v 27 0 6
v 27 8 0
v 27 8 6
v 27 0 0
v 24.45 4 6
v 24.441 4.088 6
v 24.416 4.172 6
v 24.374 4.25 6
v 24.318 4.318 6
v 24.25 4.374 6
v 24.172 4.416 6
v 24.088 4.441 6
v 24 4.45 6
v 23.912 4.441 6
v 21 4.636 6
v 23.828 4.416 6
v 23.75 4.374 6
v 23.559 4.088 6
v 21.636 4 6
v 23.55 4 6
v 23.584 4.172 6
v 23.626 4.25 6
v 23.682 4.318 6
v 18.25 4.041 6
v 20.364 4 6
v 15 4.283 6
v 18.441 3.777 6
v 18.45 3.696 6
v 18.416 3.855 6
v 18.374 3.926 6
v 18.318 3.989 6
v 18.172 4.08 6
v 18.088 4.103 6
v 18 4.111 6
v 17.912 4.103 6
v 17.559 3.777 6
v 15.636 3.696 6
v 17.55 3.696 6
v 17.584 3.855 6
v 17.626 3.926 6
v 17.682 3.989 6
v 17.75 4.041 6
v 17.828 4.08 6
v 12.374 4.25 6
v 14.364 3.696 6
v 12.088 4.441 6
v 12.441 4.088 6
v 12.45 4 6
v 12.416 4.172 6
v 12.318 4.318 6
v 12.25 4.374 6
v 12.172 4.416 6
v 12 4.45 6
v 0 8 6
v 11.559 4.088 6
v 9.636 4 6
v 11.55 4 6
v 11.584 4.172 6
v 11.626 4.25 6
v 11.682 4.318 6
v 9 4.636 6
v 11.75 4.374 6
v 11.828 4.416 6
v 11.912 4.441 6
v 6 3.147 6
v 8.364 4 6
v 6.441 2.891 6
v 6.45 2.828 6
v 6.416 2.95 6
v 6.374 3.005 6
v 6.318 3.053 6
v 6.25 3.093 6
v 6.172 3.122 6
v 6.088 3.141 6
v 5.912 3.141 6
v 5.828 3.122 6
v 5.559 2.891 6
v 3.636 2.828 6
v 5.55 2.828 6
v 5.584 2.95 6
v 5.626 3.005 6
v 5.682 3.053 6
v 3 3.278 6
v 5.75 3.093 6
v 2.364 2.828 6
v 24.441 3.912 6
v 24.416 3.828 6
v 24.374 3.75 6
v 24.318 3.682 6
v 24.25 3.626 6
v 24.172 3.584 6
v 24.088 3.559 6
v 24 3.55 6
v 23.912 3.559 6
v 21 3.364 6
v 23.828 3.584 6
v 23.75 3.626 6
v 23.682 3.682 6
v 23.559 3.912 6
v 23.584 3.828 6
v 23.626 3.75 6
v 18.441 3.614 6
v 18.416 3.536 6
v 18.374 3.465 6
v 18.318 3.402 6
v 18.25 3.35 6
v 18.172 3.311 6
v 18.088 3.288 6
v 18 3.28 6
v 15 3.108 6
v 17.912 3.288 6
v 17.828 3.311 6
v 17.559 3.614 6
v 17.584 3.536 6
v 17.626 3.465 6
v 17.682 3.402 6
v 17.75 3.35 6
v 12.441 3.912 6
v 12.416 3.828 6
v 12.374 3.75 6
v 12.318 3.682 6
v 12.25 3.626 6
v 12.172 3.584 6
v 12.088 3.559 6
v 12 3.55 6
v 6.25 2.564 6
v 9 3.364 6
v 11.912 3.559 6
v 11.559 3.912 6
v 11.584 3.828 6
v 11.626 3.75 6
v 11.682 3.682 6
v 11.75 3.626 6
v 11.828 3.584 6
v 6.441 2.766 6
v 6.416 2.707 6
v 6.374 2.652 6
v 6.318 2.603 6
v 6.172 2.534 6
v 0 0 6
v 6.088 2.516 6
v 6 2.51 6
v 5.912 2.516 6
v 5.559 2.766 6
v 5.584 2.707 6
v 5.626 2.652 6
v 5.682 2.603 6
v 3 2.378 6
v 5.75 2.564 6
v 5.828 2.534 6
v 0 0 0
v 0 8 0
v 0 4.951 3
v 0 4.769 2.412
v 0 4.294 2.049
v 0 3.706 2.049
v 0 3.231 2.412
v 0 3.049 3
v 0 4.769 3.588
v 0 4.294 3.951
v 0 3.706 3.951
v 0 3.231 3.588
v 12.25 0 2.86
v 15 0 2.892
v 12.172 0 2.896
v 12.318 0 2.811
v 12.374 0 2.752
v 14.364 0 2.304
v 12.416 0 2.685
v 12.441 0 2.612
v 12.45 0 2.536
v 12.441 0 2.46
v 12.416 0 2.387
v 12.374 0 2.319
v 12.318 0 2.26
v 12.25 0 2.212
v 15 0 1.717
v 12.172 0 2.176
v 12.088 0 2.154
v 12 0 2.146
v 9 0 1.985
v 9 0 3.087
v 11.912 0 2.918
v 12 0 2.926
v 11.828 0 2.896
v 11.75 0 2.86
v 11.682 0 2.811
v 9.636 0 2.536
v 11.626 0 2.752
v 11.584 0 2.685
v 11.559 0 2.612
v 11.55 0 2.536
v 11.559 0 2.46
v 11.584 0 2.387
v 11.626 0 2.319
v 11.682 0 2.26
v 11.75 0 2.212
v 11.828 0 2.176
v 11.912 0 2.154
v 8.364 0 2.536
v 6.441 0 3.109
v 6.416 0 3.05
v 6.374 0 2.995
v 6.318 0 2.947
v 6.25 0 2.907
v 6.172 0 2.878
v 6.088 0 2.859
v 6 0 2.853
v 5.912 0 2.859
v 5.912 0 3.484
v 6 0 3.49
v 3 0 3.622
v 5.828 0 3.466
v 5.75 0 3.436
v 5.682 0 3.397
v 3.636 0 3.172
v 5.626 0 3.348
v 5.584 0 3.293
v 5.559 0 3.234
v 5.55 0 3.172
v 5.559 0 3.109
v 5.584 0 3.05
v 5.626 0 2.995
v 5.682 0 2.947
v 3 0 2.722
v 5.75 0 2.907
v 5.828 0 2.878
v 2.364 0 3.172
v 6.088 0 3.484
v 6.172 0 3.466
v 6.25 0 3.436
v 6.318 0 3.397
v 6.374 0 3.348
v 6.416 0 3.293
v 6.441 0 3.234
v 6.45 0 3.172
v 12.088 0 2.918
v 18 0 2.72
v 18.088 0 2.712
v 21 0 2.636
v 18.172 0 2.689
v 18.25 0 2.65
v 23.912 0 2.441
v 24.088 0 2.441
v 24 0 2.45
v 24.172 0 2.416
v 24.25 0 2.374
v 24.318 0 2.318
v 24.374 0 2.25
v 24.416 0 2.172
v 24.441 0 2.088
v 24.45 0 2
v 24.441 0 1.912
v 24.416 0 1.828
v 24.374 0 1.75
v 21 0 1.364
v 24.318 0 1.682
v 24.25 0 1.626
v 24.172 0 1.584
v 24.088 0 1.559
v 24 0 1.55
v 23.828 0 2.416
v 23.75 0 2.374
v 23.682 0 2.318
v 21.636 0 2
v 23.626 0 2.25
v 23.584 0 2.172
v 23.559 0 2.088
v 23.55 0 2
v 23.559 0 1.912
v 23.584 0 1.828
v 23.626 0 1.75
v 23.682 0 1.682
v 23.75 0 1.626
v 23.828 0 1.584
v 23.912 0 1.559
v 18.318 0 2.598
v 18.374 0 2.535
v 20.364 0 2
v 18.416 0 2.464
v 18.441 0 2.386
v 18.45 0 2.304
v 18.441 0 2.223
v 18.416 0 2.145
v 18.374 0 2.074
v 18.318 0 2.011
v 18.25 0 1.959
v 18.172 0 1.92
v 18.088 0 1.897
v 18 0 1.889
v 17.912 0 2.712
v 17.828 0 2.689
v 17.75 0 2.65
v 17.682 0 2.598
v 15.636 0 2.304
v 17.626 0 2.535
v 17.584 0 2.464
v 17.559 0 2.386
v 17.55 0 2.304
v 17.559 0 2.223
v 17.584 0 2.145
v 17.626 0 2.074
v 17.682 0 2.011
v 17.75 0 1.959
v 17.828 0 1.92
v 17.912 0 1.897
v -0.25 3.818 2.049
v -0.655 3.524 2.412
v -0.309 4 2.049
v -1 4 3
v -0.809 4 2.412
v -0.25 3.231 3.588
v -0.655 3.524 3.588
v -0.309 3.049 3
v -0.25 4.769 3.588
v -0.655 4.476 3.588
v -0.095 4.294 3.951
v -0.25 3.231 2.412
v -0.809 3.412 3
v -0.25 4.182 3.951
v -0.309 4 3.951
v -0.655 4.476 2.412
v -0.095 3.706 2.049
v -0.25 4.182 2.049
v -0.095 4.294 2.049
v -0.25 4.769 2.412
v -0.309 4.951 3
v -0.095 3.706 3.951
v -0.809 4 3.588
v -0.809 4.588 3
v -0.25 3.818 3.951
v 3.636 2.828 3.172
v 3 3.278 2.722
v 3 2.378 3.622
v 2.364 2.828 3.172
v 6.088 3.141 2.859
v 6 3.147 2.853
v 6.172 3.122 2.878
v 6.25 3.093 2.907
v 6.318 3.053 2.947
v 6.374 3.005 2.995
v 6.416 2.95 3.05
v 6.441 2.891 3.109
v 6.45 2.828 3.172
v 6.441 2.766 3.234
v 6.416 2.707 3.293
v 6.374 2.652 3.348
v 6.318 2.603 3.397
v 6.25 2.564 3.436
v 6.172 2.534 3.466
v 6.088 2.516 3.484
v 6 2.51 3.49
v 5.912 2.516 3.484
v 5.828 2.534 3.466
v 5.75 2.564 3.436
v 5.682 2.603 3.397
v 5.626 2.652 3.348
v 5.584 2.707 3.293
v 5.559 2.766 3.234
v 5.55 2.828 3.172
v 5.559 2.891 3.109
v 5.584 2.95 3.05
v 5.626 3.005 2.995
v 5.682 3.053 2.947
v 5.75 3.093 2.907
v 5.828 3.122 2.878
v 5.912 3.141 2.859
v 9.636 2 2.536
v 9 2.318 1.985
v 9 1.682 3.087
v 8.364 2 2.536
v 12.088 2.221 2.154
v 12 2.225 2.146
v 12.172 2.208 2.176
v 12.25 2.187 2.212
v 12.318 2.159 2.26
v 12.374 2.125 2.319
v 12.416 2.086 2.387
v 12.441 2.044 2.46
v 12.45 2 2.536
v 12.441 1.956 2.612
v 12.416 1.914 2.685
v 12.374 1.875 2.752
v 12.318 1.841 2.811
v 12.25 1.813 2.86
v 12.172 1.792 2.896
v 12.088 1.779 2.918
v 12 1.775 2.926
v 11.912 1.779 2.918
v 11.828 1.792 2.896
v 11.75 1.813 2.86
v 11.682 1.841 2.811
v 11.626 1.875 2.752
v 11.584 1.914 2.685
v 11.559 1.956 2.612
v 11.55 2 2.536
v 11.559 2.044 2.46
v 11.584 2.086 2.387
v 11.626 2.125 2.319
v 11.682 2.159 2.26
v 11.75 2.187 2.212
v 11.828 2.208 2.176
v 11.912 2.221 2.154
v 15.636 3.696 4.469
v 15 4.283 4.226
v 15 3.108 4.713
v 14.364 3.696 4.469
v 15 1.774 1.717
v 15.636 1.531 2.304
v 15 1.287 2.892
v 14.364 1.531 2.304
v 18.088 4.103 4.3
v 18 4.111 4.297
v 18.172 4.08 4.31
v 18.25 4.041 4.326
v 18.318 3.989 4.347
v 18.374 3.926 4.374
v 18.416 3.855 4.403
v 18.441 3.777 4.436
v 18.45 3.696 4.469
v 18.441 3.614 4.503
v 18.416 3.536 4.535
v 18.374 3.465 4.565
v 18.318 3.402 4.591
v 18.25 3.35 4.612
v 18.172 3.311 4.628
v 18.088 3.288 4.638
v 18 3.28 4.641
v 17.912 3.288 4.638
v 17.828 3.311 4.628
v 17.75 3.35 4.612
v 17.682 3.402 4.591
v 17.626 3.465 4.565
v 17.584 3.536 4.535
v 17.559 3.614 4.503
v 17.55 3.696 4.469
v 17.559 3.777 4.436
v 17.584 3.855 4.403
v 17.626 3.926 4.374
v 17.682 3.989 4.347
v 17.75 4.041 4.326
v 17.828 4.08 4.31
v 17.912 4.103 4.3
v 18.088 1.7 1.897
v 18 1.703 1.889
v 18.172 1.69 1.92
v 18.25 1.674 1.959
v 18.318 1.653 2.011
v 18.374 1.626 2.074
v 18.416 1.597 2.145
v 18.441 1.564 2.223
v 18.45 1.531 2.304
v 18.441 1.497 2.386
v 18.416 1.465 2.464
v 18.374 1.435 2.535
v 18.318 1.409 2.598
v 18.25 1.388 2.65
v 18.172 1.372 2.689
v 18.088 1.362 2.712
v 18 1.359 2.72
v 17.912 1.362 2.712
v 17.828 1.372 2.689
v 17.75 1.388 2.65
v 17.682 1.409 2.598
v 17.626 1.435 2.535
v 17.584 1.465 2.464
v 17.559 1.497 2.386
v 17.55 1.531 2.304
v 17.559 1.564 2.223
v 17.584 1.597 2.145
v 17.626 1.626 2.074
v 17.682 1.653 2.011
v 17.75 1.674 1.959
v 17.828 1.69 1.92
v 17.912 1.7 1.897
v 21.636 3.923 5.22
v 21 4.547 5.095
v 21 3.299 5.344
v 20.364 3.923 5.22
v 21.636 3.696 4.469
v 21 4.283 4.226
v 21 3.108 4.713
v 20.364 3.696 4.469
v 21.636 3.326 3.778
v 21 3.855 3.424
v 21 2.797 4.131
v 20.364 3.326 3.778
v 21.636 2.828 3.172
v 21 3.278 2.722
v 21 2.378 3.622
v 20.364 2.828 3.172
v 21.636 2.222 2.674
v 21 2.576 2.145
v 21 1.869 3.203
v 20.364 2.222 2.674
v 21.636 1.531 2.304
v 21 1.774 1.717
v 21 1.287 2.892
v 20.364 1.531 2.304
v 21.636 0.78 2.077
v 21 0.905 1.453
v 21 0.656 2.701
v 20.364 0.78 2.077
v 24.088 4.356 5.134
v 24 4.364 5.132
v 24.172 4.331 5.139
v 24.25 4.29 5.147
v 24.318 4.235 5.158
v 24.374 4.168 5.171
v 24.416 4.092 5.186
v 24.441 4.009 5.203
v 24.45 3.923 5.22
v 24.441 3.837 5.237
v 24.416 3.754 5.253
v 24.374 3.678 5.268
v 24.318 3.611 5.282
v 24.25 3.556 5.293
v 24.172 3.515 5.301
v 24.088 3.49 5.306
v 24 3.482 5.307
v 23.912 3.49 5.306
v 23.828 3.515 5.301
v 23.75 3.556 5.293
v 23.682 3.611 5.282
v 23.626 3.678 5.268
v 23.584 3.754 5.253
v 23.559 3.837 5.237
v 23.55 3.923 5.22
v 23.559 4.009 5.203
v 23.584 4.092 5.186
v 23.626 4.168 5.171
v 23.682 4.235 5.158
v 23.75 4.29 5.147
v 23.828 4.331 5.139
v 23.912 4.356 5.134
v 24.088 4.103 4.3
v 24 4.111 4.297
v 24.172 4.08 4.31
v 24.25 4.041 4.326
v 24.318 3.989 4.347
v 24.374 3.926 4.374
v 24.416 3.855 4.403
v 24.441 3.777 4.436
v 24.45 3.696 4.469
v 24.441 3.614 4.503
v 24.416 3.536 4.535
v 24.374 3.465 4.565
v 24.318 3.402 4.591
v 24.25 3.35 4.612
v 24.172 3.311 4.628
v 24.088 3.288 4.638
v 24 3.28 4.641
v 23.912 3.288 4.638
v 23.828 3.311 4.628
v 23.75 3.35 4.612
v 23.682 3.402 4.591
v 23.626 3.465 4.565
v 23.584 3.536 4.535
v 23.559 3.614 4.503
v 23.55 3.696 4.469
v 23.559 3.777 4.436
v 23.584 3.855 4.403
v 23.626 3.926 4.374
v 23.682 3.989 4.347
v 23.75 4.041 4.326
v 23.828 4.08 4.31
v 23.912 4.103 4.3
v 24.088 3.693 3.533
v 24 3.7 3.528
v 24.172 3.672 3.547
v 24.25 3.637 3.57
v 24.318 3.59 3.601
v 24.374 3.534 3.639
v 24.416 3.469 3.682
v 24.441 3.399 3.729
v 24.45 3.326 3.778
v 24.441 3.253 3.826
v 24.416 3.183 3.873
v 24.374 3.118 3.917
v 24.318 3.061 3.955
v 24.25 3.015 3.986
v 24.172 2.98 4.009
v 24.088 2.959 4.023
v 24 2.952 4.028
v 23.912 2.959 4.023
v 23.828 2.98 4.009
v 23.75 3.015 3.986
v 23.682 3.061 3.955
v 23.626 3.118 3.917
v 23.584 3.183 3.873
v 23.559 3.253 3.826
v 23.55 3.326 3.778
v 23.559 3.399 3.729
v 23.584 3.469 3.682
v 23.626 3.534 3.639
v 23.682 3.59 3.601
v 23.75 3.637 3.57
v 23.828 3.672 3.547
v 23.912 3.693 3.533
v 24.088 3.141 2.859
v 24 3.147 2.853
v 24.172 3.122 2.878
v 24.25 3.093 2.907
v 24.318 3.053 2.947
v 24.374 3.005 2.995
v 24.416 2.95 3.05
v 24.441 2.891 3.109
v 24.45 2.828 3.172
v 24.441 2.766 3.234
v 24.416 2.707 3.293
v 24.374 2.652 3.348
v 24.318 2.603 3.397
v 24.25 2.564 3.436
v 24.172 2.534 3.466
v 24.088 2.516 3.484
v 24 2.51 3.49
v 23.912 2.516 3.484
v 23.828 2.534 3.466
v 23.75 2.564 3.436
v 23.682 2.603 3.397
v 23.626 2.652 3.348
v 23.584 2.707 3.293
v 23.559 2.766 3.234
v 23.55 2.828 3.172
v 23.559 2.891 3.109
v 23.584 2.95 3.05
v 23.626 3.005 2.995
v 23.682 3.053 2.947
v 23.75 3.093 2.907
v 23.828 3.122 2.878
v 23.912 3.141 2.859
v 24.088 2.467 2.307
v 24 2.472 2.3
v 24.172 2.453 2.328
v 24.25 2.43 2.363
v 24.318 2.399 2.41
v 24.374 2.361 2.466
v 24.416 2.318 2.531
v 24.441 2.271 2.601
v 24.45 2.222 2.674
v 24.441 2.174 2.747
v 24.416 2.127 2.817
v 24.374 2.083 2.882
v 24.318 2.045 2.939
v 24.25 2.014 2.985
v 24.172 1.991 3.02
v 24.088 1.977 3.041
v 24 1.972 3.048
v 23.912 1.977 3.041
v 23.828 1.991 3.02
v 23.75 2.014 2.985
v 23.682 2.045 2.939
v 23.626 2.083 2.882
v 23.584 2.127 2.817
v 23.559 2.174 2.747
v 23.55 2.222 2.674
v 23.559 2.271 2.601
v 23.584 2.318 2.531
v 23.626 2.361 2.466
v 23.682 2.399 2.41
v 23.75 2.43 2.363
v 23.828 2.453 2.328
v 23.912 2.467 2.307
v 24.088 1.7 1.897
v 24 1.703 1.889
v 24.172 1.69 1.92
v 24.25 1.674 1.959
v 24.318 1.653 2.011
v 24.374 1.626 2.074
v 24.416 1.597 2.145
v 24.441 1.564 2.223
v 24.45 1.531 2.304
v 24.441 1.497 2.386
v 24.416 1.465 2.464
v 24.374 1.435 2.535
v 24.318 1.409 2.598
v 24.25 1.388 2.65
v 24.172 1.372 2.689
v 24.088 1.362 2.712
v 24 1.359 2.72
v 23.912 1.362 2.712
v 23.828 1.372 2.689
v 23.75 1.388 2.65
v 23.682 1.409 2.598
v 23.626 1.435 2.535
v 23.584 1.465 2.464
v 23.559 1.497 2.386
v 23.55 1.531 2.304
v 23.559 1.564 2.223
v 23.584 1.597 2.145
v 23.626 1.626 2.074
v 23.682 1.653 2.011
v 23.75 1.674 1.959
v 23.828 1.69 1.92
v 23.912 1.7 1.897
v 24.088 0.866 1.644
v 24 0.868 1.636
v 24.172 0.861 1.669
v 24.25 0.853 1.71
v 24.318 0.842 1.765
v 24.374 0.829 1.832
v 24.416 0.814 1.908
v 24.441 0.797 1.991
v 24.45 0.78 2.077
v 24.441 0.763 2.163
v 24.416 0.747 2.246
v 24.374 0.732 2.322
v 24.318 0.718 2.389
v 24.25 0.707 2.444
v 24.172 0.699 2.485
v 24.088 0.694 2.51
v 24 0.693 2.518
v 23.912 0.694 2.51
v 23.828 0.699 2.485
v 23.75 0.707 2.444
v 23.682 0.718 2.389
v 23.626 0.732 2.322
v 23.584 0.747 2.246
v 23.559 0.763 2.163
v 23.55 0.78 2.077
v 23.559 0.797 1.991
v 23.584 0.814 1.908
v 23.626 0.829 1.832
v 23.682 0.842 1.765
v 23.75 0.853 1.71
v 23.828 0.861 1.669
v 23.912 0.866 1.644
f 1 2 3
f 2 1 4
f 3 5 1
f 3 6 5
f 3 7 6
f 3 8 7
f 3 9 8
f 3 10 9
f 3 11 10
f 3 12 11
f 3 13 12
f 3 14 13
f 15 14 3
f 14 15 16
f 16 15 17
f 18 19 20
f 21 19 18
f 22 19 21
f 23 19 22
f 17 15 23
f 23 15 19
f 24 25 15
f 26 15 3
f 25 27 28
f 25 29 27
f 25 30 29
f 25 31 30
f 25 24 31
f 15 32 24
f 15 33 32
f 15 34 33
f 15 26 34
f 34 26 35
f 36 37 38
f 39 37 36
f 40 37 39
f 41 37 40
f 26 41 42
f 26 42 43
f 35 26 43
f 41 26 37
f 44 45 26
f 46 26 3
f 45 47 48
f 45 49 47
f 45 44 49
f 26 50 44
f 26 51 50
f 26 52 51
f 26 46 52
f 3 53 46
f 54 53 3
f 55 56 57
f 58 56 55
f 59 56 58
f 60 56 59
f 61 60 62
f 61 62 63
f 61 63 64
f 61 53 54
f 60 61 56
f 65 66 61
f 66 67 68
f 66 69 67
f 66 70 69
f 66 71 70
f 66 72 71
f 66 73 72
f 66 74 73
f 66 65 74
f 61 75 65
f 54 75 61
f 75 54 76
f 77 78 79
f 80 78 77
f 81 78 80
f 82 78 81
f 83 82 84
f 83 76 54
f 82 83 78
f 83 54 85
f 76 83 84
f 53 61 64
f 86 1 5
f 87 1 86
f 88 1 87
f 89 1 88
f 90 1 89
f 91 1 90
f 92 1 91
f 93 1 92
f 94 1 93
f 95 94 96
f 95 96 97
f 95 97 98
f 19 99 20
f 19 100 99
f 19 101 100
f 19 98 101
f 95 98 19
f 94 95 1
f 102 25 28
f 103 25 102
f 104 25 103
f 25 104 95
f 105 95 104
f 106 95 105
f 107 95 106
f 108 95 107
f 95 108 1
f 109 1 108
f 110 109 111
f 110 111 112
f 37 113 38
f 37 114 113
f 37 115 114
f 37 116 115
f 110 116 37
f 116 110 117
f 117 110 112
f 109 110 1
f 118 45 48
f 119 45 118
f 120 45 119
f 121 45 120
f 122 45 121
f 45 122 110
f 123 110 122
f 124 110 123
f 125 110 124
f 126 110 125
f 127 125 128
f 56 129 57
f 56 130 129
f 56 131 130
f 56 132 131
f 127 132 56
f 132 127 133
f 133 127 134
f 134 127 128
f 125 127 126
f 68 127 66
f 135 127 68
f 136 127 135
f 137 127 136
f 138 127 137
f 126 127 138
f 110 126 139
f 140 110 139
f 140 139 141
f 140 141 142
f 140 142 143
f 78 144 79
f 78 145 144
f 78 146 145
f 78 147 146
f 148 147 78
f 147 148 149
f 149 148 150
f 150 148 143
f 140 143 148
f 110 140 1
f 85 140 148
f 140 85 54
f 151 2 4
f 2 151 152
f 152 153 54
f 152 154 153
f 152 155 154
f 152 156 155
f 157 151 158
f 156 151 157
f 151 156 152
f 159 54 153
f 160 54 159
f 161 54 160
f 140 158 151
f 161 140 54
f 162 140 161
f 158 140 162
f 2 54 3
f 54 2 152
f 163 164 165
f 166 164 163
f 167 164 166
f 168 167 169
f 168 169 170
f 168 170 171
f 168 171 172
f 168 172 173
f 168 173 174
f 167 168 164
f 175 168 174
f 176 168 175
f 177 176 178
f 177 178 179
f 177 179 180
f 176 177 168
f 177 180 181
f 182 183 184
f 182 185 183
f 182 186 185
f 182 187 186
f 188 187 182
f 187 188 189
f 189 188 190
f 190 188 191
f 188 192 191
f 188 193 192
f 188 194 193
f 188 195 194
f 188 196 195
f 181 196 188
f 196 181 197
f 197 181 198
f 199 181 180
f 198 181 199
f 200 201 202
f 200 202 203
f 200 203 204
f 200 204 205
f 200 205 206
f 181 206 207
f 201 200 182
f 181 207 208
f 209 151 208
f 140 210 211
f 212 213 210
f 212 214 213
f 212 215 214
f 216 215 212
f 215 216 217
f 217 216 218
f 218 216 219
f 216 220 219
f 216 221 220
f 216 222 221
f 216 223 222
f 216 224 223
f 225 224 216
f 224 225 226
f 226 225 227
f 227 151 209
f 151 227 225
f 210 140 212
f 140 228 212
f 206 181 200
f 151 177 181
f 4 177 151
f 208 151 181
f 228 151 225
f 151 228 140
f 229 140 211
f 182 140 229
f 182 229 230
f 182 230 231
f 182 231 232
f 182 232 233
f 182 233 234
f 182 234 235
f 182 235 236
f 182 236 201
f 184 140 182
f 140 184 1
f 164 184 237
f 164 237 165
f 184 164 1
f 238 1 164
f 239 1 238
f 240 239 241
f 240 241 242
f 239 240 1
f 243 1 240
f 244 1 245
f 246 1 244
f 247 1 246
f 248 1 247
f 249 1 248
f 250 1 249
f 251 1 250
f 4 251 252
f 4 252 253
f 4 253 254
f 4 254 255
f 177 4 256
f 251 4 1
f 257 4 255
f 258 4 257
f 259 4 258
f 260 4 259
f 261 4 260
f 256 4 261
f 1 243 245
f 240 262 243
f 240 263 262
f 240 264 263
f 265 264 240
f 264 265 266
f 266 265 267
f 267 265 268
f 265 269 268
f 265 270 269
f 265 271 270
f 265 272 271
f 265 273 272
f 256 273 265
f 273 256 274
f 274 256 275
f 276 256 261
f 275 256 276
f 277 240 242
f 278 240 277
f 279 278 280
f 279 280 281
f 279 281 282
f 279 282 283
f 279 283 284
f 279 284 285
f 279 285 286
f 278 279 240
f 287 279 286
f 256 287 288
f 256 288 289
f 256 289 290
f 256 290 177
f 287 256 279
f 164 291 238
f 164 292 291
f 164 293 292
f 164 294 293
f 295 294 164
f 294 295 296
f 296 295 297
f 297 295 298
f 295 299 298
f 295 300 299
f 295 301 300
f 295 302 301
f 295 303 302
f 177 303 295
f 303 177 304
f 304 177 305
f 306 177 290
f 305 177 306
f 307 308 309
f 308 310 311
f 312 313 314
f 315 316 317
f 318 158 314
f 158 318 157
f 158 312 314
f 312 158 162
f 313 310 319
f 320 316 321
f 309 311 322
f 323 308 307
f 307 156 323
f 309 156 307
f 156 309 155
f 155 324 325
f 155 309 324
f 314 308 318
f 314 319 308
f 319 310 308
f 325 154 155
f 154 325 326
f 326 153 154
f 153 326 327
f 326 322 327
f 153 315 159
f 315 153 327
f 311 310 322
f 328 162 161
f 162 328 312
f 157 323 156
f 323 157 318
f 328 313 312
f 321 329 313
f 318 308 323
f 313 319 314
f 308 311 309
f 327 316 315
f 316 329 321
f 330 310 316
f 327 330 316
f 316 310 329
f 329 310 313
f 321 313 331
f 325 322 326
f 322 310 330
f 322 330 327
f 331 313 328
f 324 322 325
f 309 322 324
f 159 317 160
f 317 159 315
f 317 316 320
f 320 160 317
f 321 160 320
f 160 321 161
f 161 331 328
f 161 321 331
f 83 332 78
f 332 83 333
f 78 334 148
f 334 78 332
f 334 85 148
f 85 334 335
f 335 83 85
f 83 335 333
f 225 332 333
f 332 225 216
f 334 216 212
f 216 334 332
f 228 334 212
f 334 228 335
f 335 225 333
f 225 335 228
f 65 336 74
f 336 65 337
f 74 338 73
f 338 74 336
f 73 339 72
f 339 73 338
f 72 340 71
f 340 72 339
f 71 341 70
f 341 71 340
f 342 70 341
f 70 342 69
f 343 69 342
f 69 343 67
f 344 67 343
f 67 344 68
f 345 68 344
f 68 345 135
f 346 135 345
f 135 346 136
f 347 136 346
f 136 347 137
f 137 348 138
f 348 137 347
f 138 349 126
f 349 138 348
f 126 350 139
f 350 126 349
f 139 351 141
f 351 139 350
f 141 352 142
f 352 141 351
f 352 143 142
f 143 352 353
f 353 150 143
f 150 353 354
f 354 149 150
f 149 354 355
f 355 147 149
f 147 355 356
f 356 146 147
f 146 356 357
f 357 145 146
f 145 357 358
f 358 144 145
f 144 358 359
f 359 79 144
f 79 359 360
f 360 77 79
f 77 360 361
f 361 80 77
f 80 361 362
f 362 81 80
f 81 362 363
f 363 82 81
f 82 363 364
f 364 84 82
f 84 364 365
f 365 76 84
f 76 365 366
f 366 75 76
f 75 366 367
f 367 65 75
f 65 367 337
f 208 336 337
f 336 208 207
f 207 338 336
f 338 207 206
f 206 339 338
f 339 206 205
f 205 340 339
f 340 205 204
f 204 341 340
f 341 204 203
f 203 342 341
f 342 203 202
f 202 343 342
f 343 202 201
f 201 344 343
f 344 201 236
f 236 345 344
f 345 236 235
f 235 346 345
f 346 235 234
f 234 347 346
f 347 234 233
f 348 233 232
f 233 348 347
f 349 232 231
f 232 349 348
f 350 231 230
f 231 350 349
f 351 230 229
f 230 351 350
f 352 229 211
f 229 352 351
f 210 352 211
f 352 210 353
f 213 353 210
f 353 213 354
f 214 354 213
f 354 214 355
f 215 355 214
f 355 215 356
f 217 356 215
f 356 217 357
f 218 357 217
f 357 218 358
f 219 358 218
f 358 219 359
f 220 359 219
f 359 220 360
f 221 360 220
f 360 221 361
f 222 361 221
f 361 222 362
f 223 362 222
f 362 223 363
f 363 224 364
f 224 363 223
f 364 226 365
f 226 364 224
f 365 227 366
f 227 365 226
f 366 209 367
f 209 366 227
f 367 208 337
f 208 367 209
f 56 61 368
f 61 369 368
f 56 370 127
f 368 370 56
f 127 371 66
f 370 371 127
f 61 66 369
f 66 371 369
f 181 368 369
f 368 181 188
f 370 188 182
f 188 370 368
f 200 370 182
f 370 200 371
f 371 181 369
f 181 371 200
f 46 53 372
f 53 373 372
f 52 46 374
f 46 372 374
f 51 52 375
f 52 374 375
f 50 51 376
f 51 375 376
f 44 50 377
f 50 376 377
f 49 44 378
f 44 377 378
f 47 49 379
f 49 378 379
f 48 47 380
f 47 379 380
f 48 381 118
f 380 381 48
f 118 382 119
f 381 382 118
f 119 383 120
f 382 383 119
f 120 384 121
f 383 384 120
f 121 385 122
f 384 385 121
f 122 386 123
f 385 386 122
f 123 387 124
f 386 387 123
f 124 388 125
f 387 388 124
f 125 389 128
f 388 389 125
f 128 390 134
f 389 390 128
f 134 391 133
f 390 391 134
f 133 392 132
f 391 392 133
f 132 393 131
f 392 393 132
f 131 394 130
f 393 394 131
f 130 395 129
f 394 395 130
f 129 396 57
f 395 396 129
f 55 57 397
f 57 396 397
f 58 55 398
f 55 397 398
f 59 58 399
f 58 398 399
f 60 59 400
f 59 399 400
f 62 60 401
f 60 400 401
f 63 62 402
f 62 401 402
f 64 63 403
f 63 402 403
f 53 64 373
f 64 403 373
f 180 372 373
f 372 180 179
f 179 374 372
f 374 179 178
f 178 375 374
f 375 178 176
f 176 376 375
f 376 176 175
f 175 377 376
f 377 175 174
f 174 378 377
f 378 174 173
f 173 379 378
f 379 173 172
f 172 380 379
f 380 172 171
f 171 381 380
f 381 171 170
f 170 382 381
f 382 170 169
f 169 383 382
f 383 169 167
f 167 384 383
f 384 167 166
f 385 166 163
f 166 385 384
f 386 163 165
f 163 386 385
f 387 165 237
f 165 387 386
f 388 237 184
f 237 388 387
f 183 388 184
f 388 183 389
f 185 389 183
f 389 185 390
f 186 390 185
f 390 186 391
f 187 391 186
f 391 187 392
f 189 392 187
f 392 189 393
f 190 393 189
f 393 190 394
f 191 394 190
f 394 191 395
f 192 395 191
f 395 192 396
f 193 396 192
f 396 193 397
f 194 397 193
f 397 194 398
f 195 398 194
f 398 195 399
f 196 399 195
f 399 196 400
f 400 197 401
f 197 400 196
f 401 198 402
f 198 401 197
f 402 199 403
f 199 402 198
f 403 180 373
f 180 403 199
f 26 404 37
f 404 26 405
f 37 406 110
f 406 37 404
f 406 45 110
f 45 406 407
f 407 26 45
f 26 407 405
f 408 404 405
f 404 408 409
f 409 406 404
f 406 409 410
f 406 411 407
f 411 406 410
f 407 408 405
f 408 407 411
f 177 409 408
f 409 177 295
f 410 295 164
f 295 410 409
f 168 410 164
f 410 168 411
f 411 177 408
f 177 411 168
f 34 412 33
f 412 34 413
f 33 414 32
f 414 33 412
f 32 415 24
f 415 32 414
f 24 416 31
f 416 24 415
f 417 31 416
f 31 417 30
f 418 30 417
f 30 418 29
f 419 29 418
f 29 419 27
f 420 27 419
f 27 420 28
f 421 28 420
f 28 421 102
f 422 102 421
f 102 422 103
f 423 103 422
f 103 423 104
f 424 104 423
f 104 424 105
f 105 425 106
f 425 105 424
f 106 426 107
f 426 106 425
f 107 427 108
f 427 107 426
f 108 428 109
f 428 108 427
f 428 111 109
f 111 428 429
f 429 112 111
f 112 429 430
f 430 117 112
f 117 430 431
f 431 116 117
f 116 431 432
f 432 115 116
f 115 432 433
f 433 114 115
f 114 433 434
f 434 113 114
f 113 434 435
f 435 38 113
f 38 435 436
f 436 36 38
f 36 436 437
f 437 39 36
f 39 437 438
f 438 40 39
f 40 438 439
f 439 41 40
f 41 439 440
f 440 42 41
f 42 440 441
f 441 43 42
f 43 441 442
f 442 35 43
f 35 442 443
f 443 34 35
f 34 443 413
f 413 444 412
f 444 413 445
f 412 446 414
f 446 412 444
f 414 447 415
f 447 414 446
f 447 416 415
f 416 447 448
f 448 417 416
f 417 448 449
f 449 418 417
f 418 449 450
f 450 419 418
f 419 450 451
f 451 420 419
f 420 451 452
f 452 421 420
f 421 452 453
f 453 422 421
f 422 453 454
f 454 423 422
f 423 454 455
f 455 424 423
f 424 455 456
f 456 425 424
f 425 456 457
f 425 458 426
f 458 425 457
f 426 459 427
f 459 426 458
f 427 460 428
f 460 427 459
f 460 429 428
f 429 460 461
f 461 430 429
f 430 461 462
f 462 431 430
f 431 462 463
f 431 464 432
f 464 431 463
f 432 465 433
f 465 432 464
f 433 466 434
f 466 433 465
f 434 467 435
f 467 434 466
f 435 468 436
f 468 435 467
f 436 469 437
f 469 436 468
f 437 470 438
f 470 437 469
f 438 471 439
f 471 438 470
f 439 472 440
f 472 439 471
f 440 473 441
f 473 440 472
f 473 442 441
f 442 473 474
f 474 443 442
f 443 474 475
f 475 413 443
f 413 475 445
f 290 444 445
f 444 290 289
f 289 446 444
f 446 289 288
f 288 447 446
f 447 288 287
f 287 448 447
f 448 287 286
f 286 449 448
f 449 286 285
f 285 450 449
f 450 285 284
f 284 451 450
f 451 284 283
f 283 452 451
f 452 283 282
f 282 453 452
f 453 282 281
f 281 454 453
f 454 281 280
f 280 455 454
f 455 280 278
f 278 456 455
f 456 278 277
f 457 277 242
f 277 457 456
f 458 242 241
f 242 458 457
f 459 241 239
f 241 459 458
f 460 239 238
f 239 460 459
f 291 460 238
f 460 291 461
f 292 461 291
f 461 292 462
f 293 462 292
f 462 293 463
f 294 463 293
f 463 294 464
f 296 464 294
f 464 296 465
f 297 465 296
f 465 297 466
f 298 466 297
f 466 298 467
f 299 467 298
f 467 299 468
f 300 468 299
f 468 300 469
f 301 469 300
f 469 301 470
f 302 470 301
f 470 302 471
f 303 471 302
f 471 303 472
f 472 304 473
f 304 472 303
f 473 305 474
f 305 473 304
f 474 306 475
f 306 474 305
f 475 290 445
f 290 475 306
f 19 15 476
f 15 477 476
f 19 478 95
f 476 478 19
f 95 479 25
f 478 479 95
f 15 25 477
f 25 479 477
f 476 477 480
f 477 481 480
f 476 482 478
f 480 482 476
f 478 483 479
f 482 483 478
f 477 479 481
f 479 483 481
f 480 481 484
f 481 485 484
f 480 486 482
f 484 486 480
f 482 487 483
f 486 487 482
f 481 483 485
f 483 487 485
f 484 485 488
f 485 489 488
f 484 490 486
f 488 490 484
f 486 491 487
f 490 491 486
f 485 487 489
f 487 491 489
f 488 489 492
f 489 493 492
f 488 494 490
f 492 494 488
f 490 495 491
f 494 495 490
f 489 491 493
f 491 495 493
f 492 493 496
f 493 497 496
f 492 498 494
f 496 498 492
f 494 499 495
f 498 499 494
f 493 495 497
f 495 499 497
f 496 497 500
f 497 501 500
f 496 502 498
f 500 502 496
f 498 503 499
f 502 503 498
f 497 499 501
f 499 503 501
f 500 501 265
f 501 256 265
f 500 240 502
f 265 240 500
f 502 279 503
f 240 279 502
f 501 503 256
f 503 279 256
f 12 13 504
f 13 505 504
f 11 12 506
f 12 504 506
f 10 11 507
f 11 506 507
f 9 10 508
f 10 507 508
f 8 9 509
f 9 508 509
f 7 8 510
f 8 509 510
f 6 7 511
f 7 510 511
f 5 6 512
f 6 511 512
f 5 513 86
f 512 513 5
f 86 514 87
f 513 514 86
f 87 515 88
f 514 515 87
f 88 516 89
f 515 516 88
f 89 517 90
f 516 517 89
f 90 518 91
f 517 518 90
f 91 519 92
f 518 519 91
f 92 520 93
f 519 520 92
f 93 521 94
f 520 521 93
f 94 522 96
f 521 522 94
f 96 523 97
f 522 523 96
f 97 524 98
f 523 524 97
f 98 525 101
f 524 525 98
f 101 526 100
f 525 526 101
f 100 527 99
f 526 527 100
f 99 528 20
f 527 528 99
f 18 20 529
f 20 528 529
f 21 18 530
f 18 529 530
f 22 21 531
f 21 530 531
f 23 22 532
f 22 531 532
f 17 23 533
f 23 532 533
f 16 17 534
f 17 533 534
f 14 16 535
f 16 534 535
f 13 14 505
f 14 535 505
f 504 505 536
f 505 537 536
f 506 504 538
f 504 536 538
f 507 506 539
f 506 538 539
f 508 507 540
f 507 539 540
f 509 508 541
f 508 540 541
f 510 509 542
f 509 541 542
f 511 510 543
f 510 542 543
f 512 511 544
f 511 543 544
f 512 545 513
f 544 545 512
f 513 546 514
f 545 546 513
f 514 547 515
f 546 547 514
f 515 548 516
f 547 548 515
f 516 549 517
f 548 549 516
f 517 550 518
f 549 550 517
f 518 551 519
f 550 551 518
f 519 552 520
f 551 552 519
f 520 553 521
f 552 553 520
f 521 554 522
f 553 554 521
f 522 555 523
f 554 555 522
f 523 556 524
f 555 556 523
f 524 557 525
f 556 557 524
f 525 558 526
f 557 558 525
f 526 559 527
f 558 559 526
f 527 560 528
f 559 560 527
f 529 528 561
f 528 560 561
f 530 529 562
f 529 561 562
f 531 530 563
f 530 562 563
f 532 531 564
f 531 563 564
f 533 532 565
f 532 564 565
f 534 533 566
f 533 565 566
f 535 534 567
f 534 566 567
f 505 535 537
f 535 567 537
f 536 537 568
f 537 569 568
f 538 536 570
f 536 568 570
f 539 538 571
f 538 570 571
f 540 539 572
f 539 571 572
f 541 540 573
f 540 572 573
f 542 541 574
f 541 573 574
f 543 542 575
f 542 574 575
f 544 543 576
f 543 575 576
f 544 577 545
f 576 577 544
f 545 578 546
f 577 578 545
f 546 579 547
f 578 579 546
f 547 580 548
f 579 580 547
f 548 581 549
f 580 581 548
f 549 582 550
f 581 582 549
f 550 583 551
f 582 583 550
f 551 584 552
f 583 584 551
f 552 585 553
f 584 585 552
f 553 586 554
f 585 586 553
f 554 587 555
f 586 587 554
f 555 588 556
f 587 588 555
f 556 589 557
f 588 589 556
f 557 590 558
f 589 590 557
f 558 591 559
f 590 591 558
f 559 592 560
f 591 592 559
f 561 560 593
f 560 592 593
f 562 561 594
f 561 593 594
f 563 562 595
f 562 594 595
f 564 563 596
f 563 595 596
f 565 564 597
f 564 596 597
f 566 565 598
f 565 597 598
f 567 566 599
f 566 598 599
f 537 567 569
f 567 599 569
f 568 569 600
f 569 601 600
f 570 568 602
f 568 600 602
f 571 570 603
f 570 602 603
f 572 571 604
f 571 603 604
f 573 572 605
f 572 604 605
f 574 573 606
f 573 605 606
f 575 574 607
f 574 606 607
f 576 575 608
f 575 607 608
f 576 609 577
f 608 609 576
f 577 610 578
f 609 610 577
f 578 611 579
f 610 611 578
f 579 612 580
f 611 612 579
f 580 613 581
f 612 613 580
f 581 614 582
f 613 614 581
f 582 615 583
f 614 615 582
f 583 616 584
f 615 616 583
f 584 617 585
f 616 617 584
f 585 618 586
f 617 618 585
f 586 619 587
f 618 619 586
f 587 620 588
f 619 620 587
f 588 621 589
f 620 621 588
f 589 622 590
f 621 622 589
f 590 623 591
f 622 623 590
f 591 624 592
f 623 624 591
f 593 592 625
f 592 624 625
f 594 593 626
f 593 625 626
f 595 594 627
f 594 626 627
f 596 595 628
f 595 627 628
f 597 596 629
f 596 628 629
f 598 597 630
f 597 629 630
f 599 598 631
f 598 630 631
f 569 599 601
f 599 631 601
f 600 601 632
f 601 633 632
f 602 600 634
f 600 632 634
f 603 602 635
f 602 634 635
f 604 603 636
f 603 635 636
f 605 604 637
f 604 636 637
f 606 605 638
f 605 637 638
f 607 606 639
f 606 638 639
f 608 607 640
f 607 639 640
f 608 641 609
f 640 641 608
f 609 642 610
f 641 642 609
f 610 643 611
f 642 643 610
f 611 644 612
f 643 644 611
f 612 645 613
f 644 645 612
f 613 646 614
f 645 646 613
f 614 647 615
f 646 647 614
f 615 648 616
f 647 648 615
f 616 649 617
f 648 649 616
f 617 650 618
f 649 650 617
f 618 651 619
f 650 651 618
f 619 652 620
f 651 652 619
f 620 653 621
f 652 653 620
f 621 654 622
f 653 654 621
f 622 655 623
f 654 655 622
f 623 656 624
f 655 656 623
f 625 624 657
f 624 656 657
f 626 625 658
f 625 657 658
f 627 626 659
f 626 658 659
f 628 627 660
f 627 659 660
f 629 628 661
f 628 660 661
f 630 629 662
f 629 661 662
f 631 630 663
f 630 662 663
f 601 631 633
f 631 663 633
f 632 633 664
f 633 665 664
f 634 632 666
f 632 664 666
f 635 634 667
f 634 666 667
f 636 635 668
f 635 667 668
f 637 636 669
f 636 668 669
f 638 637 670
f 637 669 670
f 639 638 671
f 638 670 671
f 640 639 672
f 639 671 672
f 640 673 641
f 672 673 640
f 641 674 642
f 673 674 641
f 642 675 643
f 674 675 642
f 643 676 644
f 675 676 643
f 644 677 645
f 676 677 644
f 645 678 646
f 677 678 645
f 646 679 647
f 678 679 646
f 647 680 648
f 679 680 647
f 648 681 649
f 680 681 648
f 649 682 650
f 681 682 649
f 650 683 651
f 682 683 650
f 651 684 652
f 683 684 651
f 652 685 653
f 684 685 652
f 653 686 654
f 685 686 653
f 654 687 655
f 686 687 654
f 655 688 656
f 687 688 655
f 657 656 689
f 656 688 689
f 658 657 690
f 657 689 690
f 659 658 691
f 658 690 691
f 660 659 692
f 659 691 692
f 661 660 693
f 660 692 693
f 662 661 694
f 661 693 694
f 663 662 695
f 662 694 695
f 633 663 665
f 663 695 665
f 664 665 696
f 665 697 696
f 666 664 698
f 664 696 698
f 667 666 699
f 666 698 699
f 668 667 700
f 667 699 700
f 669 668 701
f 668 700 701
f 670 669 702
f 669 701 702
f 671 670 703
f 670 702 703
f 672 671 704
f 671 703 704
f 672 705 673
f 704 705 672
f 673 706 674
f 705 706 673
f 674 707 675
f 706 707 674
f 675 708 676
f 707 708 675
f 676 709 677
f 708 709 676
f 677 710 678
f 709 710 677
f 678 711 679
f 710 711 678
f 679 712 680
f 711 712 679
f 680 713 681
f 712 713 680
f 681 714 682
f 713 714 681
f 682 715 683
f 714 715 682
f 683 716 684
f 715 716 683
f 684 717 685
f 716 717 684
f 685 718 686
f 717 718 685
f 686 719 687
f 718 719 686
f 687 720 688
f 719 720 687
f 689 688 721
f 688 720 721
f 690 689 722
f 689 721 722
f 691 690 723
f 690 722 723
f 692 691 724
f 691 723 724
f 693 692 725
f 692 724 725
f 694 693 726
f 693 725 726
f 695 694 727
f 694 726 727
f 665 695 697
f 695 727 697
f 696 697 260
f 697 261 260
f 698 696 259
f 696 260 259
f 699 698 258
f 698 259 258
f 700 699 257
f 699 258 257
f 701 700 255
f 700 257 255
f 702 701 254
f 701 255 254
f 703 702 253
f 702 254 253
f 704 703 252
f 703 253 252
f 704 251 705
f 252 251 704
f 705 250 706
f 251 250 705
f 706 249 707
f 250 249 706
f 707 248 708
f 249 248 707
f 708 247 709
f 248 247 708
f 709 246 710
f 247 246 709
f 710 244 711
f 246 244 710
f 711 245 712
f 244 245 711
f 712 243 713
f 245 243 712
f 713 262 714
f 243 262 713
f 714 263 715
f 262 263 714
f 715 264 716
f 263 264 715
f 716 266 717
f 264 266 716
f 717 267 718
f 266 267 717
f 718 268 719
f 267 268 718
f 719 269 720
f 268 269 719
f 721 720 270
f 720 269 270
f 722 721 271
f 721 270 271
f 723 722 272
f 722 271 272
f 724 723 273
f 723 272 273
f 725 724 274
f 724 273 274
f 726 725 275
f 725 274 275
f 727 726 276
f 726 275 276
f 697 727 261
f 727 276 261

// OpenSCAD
// Test piece to try out different sizes and shapes for printed "filament tubes"

width = 27;
len = 8;
height = 6;

path_r = 4;
filament_r = 0.45;//0.5/2;

spacing = 3; //width / 5;
path_circle_fn = 64;
circle_fn = 32;

square = 4;
hexagon = 6;
octagon = 8; 
circle = circle_fn;
paths = [square, hexagon, octagon, circle];
cross_sections = [square, circle];

square_factor = sqrt(2);  // factor to enlarge a diamond to fit a square

// Order, circle_r, path, circle, rotation
rings = [
[1, filament_r * square_factor, square, square, 45],
[2, filament_r, square, circle, 45],
[3, filament_r * square_factor, hexagon, square, 30],
[4, filament_r, hexagon, circle, 30],
[5, filament_r * square_factor, octagon, square, 22.5],
[6, filament_r, octagon, circle, 22.5],
[7, filament_r * square_factor, circle, square, 0],
[8, filament_r, circle, circle, 0],
];

module curved_path(path_r, circle_r, path_fn = 3, circle_fn = 3, rotation = 0) {
	rotate([rotation, 0, 0]) rotate([0, 90, 0])
		rotate_extrude(convexity = 10, $fn = path_fn)
			translate([path_r, 0, 0]) circle(r = circle_r, $fn = circle_fn);
}

module rings(path_r) {
	for (l = rings) {
		assign(i=l[0], cr=l[1], p=l[2], c=l[3], r=l[4]) {
			echo("i =", i, " cr=", cr, " p=", p, " c=", c, " r=", r);
			#translate([spacing*i, 0, 0])
				curved_path(path_r, cr, p, c, r);
		}
	}
}

module test_block() {
	difference() {
		union() {	
			translate([0, 0, 0]) cube([width, len, height]);
			translate([0, len/2, height/2]) sphere(r=1, $fn=10);
		}
		translate([0, 0, height]) rings(path_r);
	}
}

test_block();
